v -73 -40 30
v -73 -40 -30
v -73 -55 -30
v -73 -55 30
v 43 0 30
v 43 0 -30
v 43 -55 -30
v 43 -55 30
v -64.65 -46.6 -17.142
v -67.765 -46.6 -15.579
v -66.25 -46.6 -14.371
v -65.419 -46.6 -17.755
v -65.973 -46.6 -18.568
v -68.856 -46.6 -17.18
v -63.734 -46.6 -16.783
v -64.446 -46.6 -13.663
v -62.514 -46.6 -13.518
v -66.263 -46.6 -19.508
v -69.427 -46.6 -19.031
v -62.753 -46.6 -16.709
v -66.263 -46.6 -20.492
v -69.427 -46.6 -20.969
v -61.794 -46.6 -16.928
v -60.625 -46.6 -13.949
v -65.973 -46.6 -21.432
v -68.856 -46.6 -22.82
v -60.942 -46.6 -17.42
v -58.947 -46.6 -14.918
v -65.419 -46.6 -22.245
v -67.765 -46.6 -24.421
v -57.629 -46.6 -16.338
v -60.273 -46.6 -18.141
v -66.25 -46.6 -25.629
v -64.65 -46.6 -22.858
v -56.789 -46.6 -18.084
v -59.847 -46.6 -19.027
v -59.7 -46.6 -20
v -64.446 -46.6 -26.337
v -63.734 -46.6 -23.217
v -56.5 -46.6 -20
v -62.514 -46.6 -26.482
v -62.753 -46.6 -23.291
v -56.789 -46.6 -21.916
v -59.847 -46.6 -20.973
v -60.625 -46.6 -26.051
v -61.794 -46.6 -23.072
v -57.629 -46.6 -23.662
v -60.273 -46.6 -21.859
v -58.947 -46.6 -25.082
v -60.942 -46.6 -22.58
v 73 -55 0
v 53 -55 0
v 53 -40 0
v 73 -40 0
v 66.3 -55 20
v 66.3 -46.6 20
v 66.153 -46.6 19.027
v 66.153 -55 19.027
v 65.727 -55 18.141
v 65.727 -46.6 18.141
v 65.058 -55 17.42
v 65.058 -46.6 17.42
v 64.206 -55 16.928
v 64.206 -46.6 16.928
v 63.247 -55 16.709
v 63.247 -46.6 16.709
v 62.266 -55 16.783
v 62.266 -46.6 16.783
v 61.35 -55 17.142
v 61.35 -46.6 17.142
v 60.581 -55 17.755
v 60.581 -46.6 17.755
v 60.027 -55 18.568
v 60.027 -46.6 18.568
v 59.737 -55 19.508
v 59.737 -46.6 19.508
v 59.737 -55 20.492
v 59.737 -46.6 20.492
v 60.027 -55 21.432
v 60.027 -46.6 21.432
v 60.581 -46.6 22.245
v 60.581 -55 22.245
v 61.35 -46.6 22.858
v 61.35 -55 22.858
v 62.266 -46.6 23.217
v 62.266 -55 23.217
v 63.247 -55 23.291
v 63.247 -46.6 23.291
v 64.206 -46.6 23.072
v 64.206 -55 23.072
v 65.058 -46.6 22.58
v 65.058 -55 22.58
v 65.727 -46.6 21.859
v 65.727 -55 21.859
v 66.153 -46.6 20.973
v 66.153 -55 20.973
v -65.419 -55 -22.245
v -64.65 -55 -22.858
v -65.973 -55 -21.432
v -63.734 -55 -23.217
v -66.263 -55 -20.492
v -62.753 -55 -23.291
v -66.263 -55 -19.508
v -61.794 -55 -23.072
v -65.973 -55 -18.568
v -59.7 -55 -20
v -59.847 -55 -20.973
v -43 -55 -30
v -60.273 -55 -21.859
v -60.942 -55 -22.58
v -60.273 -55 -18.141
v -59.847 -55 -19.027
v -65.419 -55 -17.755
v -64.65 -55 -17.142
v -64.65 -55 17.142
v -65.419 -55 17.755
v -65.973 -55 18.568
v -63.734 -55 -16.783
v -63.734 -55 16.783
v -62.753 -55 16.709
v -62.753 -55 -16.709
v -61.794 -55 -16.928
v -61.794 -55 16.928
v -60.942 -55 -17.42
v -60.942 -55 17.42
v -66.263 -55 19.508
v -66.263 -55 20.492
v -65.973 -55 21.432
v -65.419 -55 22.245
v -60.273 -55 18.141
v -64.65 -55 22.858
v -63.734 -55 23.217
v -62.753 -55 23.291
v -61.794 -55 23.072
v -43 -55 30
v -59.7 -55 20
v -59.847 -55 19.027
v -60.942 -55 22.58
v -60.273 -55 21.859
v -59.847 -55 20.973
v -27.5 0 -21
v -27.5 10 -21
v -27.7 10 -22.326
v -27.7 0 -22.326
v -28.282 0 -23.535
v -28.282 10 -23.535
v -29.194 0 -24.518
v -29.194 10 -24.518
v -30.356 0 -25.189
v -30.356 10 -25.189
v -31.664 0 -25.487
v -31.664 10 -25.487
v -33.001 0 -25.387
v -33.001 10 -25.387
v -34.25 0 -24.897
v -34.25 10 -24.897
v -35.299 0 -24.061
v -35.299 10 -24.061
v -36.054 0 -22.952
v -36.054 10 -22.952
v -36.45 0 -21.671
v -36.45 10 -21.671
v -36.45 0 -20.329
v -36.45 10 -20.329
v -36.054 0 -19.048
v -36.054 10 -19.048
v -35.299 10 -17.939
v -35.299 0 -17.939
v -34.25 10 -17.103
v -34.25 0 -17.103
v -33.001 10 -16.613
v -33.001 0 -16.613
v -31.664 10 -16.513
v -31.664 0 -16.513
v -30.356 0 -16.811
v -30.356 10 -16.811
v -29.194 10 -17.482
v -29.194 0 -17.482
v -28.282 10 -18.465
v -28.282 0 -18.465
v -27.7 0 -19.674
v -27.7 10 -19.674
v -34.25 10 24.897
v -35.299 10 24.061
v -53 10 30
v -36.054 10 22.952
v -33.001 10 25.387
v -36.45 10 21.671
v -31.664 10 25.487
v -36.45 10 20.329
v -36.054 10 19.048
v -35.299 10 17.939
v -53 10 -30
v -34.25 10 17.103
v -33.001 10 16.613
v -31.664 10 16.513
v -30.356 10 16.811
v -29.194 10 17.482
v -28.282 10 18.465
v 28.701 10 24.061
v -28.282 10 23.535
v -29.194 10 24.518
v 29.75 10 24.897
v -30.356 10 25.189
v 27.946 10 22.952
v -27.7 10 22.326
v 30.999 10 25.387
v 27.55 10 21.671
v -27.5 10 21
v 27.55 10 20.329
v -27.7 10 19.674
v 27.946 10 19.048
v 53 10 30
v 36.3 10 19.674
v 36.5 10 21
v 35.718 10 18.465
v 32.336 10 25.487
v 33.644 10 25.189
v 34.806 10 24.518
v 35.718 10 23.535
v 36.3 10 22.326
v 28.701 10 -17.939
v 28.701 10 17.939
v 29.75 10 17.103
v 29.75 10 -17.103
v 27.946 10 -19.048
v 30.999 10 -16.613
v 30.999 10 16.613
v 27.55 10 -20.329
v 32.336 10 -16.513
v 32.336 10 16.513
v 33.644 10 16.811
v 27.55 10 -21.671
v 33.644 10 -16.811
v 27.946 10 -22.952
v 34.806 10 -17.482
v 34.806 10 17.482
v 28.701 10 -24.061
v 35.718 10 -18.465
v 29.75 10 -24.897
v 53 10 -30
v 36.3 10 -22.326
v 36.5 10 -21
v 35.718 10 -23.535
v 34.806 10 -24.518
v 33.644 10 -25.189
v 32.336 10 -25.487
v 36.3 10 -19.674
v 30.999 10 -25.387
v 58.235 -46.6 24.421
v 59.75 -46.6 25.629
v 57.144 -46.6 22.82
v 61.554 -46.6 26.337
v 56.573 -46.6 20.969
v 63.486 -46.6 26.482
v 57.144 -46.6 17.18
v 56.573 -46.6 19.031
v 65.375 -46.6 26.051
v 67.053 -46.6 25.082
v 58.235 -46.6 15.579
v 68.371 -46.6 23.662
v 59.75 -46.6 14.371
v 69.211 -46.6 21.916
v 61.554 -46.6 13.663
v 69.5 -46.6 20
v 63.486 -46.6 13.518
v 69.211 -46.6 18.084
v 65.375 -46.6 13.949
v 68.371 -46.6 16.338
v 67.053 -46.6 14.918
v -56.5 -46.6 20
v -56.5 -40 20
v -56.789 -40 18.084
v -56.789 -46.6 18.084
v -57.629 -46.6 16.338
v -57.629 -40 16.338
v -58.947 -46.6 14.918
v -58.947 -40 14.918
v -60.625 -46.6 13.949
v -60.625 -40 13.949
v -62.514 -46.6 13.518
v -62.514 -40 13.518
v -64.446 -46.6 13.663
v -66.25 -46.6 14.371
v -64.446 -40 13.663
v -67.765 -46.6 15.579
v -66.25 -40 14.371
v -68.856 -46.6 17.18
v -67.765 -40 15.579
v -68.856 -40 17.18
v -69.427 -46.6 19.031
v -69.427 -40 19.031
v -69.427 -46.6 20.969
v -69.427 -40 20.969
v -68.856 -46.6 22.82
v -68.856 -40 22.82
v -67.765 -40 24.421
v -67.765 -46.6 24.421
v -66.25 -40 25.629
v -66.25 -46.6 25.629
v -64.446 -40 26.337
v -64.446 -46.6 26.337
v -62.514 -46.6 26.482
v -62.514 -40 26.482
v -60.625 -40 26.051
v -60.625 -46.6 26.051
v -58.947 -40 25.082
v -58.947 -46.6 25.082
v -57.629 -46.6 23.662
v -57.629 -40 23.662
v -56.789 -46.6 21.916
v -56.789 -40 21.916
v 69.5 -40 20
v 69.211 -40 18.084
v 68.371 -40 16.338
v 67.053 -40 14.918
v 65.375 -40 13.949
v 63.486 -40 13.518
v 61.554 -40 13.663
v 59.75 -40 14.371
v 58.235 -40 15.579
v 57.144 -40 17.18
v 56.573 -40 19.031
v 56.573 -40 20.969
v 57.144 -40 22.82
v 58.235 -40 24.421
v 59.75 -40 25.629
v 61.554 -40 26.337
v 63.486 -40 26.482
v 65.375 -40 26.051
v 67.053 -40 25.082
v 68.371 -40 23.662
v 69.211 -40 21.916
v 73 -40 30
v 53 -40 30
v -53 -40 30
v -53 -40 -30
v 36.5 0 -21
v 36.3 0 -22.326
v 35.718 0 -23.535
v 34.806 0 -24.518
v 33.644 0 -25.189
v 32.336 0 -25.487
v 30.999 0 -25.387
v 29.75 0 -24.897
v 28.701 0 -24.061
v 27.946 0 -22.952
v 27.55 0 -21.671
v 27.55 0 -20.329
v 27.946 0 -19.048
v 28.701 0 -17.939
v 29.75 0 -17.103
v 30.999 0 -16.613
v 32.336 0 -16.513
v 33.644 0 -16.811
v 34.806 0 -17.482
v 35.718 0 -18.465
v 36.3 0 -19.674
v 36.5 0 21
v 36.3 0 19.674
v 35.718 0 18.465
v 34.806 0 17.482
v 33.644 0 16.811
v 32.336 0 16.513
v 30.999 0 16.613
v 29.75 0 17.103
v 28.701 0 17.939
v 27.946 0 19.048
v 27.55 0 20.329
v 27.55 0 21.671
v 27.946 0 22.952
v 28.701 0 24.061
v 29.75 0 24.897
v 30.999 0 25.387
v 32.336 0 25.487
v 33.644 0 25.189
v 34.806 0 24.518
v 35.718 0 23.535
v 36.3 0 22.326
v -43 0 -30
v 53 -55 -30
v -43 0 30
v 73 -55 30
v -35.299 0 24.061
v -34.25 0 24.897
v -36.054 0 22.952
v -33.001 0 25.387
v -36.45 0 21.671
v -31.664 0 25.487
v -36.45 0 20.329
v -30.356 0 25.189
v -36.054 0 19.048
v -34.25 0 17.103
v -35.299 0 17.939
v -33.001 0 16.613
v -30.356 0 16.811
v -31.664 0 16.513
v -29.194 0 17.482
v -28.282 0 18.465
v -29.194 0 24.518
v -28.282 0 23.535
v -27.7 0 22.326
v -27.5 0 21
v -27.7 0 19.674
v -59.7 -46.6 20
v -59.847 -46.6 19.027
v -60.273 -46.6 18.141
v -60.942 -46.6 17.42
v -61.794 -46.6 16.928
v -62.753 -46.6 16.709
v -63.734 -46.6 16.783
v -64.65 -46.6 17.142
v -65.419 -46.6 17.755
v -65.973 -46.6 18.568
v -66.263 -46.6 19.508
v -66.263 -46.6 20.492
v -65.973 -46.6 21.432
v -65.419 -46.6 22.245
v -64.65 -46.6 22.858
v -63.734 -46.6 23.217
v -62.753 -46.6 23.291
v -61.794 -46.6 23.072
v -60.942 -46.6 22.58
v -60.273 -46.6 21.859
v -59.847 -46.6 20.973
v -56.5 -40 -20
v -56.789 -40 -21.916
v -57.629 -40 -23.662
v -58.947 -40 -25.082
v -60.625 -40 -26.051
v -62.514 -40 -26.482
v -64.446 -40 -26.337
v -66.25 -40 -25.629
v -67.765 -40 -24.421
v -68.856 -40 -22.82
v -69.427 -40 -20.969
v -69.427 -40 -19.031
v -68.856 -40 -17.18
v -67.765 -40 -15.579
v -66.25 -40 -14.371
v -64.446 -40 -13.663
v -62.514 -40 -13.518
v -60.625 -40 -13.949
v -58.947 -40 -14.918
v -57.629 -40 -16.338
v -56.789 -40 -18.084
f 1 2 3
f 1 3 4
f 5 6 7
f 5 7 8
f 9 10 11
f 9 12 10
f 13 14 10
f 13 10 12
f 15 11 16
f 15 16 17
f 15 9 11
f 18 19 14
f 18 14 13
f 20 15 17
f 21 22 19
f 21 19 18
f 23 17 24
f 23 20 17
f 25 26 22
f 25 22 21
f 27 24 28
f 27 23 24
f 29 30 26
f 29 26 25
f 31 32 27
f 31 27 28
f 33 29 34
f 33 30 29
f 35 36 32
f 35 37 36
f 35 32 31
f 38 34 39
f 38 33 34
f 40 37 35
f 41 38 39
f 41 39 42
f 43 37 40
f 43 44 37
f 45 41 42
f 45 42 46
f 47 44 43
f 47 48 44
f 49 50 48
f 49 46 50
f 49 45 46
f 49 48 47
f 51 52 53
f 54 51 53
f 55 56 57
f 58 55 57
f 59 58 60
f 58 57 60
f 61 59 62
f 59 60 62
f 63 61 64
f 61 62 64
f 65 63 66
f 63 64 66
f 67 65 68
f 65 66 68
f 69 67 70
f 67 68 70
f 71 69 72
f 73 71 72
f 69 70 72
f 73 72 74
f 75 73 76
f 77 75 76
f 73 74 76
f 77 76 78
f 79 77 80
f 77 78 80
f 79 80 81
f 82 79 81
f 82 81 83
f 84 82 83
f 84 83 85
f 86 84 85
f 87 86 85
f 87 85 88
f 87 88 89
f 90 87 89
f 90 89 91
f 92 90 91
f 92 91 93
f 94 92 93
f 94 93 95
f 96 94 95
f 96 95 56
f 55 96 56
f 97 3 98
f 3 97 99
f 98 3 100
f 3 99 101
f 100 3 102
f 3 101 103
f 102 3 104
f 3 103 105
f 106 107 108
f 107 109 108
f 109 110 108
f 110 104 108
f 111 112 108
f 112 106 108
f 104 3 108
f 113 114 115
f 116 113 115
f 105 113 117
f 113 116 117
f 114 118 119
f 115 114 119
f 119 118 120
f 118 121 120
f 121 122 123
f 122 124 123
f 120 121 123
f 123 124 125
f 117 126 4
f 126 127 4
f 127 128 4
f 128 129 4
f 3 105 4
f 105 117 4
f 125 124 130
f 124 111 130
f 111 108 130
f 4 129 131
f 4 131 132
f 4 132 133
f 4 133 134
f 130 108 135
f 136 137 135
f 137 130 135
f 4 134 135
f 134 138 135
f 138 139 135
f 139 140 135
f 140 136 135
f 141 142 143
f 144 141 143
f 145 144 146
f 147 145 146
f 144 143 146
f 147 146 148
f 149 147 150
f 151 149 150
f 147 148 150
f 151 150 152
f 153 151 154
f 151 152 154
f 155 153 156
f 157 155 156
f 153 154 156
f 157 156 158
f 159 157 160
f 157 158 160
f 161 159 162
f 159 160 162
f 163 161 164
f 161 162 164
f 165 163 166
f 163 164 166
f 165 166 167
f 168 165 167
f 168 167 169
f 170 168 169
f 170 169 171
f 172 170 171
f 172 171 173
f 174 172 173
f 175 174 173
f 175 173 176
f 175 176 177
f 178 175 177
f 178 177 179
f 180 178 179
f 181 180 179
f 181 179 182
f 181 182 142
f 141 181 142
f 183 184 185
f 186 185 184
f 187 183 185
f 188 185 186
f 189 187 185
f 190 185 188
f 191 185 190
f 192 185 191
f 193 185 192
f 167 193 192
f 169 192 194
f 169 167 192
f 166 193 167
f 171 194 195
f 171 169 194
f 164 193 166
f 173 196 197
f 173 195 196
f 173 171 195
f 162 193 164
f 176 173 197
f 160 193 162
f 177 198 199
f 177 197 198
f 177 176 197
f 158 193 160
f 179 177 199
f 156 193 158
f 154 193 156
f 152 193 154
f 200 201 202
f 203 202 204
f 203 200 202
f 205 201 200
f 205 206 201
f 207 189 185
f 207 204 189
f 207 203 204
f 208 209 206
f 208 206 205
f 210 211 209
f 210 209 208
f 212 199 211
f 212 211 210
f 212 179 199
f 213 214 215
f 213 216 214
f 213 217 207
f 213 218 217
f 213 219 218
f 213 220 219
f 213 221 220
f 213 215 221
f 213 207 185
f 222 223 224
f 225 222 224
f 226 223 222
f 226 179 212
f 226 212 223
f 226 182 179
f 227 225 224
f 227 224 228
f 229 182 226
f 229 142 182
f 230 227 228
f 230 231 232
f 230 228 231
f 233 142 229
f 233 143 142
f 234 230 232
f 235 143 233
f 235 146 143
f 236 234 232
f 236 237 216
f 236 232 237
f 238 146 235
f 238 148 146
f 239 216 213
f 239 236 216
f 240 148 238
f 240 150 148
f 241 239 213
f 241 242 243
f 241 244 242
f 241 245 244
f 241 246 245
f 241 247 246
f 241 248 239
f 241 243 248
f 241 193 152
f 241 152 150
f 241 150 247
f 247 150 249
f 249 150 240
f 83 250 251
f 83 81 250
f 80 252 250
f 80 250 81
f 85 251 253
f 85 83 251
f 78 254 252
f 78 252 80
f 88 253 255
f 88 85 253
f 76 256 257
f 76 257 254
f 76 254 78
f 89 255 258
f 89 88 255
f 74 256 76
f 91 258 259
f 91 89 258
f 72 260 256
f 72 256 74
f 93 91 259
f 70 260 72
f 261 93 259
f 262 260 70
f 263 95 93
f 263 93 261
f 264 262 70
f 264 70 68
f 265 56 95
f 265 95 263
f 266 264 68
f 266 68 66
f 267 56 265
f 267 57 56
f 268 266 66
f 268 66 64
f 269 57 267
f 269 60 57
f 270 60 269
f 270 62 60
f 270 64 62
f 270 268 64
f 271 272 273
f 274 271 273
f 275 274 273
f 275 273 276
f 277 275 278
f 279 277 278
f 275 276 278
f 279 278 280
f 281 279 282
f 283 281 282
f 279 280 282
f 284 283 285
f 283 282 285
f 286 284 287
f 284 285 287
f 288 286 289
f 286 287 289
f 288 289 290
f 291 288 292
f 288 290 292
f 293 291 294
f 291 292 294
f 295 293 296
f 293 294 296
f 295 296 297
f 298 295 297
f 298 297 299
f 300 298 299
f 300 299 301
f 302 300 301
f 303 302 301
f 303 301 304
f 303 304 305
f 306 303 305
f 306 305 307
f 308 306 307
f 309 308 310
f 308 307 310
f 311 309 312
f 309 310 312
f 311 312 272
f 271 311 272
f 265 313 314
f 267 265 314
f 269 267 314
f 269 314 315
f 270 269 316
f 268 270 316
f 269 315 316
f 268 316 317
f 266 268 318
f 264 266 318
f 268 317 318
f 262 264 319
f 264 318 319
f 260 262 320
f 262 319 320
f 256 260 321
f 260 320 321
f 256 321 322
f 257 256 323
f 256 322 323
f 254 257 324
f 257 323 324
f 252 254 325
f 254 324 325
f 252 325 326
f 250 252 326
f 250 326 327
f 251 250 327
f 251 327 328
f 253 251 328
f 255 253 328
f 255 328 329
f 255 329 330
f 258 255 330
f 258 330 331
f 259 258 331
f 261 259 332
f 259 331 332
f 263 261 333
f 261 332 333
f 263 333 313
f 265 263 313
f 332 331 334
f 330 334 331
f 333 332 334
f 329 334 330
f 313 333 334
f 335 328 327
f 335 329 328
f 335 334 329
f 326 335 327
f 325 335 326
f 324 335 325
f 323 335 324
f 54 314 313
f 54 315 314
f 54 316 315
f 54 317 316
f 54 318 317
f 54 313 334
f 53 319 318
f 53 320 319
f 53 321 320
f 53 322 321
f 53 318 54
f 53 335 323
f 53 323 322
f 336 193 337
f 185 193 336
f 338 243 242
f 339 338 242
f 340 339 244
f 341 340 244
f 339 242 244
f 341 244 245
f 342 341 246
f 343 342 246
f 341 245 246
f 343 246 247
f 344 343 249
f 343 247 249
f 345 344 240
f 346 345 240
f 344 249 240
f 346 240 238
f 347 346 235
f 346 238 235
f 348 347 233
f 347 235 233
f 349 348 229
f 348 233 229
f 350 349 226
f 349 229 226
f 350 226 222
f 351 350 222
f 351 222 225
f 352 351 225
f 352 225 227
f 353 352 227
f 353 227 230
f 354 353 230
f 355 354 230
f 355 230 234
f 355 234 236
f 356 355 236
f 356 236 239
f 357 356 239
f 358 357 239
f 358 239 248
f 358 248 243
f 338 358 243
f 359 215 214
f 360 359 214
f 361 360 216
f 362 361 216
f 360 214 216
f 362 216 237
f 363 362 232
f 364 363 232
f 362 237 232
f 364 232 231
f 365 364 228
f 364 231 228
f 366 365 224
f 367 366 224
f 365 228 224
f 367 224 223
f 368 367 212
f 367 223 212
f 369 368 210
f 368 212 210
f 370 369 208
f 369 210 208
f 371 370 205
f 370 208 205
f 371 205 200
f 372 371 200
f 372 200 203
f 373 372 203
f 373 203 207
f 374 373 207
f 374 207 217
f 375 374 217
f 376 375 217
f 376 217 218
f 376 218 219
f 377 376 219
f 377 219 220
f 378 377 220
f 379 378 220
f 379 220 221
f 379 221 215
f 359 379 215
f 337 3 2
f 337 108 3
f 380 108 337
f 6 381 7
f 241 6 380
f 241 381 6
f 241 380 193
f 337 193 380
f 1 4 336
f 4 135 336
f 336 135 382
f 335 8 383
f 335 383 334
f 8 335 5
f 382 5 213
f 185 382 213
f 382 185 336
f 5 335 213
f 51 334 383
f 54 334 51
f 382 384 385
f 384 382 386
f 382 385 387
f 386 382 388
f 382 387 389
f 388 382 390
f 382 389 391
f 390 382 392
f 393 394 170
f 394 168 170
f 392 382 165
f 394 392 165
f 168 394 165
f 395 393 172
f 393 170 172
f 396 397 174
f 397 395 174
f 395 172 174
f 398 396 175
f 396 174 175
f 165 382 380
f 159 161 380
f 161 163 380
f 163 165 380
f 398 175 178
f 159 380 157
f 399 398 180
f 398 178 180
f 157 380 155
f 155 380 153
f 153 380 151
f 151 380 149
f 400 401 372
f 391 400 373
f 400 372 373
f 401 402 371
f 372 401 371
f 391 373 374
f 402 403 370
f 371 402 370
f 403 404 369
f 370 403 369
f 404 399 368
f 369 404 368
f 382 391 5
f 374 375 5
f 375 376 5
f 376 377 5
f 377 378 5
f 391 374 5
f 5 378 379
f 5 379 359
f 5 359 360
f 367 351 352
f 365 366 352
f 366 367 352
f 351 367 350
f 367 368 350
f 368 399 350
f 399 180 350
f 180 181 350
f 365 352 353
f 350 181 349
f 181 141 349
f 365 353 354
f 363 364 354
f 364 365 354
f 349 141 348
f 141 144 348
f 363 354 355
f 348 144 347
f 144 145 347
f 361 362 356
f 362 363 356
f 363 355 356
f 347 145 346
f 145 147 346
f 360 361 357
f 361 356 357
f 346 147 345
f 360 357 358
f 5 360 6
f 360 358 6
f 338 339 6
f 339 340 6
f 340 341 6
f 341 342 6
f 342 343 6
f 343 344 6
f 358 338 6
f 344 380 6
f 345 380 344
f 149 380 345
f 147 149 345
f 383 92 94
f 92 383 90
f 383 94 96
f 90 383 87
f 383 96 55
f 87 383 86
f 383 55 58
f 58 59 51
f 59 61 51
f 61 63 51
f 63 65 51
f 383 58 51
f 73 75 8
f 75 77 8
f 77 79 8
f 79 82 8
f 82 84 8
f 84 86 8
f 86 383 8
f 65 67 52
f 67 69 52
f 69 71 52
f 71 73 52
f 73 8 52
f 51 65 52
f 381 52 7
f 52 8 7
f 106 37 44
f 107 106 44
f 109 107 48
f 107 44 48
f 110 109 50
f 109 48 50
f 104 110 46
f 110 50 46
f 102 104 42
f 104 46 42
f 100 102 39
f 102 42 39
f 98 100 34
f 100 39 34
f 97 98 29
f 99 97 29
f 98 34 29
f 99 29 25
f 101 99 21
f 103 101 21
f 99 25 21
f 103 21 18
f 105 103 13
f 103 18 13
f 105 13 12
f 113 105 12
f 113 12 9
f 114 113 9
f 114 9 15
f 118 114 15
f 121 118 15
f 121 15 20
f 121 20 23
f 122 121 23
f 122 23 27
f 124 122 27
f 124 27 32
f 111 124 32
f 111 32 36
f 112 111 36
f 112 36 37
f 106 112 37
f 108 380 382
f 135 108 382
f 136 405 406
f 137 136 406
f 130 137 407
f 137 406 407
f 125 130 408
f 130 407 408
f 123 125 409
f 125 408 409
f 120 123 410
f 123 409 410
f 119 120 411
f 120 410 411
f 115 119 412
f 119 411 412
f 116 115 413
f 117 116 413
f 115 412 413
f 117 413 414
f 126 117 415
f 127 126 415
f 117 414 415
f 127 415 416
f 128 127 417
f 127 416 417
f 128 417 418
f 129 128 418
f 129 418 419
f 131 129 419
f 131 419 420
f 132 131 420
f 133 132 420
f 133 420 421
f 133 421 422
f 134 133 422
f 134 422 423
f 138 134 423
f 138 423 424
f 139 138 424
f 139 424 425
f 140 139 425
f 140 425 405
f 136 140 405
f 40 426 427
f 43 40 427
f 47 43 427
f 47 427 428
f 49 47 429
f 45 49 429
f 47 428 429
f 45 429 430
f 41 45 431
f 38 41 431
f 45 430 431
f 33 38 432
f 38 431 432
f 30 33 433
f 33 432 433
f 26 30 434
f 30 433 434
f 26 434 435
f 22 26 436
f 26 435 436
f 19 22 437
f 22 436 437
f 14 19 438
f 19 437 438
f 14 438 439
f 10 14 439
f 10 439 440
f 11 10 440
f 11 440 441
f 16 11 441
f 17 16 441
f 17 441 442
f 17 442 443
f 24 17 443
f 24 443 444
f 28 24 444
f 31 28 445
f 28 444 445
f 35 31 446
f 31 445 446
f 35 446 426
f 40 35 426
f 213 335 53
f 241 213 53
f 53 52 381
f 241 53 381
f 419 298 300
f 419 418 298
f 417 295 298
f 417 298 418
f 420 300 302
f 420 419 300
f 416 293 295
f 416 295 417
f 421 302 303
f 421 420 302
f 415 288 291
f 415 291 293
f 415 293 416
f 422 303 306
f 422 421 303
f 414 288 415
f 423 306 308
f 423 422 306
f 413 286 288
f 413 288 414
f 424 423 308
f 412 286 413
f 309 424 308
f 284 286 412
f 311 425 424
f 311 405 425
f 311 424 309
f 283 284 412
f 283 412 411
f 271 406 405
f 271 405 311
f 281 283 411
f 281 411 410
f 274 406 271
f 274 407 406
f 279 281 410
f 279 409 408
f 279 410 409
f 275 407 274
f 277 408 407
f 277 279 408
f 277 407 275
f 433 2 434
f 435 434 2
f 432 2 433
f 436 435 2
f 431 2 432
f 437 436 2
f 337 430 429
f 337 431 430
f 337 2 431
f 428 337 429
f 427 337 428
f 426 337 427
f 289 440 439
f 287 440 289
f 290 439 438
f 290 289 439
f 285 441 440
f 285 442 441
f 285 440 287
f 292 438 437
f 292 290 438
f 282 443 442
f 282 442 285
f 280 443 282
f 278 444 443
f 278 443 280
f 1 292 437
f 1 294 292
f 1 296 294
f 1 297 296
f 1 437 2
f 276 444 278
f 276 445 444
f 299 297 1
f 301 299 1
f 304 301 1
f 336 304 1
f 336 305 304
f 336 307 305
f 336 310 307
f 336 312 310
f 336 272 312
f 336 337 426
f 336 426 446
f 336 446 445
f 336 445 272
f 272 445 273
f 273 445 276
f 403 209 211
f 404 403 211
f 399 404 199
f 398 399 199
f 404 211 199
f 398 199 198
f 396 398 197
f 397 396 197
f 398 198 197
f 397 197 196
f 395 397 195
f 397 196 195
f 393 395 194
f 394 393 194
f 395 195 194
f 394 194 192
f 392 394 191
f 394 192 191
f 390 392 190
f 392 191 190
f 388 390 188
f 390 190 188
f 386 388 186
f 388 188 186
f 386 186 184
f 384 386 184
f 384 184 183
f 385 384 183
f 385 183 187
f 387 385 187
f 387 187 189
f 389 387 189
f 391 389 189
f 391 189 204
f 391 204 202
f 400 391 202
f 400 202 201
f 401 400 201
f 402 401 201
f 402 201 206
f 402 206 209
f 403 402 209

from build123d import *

# Parameters (mm, degrees)
SKETCH1_W           = 106
SKETCH1_H           = 60
BOSS_EXTRUDE1_DEPTH = 10
SKETCH2_W           = 10
SKETCH2_H           = 60
BOSS_EXTRUDE2_DEPTH = 55
SKETCH3_W           = 30
SKETCH3_H           = 15
BOSS_EXTRUDE3_DEPTH = 20
SKETCH4_W           = 60
SKETCH4_H           = 15
BOSS_EXTRUDE4_DEPTH = 20
SKETCH5_R           = 4.5
CUT_EXTRUDE1_DEPTH  = 66
SKETCH6_R           = 6.5
CUT_EXTRUDE2_DEPTH  = 6.6
SKETCH7_R           = 3.3
CUT_EXTRUDE3_DEPTH  = 9.4


with BuildPart() as part:
    # Sketch1 → Boss-Extrude1 (new body)
    with BuildSketch(Plane(origin=(0, 0, 0), x_dir=(1, 0, 0), z_dir=(0, 1, 0))):
        Rectangle(SKETCH1_W, SKETCH1_H)
    extrude(amount=BOSS_EXTRUDE1_DEPTH)

    # Sketch2 → Boss-Extrude2 (add)
    with BuildSketch(Plane.XZ):
        with Locations((-48, 0)):
            Rectangle(SKETCH2_W, SKETCH2_H)
        with Locations((48, 0)):
            Rectangle(SKETCH2_W, SKETCH2_H)
    extrude(amount=BOSS_EXTRUDE2_DEPTH)

    # Sketch3 → Boss-Extrude3 (add)
    with BuildSketch(Plane(origin=(53, 0, 0), x_dir=(0, 0, -1), z_dir=(1, 0, 0))):
        with Locations((-15, -47.5)):
            Rectangle(SKETCH3_W, SKETCH3_H)
    extrude(amount=BOSS_EXTRUDE3_DEPTH)

    # Sketch4 → Boss-Extrude4 (add)
    with BuildSketch(Plane.ZY.offset(53)):
        with Locations((0, -47.5)):
            Rectangle(SKETCH4_W, SKETCH4_H)
    extrude(amount=BOSS_EXTRUDE4_DEPTH)

    # Sketch5 → Cut-Extrude1 (cut, through all)
    with BuildSketch(Plane(origin=(0, 10, 0), x_dir=(1, 0, 0), z_dir=(0, 1, 0))):
        with Locations((-32, 21)):
            Circle(SKETCH5_R)
        with Locations((32, 21)):
            Circle(SKETCH5_R)
        with Locations((32, -21)):
            Circle(SKETCH5_R)
        with Locations((-32, -21)):
            Circle(SKETCH5_R)
    extrude(amount=-CUT_EXTRUDE1_DEPTH, mode=Mode.SUBTRACT)

    # Sketch6 → Cut-Extrude2 (cut)
    with BuildSketch(Plane(origin=(0, -40, 0), x_dir=(1, 0, 0), z_dir=(0, 1, 0))):
        with Locations((63, -20)):
            Circle(SKETCH6_R)
        with Locations((-63, 20)):
            Circle(SKETCH6_R)
        with Locations((-63, -20)):
            Circle(SKETCH6_R)
    extrude(amount=-CUT_EXTRUDE2_DEPTH, mode=Mode.SUBTRACT)

    # Sketch7 → Cut-Extrude3 (cut, through all)
    with BuildSketch(Plane(origin=(0, -46.6, 0), x_dir=(1, 0, 0), z_dir=(0, 1, 0))):
        with Locations((-63, 20)):
            Circle(SKETCH7_R)
        with Locations((-63, -20)):
            Circle(SKETCH7_R)
        with Locations((63, -20)):
            Circle(SKETCH7_R)
    extrude(amount=-CUT_EXTRUDE3_DEPTH, mode=Mode.SUBTRACT)


solid = part.part
